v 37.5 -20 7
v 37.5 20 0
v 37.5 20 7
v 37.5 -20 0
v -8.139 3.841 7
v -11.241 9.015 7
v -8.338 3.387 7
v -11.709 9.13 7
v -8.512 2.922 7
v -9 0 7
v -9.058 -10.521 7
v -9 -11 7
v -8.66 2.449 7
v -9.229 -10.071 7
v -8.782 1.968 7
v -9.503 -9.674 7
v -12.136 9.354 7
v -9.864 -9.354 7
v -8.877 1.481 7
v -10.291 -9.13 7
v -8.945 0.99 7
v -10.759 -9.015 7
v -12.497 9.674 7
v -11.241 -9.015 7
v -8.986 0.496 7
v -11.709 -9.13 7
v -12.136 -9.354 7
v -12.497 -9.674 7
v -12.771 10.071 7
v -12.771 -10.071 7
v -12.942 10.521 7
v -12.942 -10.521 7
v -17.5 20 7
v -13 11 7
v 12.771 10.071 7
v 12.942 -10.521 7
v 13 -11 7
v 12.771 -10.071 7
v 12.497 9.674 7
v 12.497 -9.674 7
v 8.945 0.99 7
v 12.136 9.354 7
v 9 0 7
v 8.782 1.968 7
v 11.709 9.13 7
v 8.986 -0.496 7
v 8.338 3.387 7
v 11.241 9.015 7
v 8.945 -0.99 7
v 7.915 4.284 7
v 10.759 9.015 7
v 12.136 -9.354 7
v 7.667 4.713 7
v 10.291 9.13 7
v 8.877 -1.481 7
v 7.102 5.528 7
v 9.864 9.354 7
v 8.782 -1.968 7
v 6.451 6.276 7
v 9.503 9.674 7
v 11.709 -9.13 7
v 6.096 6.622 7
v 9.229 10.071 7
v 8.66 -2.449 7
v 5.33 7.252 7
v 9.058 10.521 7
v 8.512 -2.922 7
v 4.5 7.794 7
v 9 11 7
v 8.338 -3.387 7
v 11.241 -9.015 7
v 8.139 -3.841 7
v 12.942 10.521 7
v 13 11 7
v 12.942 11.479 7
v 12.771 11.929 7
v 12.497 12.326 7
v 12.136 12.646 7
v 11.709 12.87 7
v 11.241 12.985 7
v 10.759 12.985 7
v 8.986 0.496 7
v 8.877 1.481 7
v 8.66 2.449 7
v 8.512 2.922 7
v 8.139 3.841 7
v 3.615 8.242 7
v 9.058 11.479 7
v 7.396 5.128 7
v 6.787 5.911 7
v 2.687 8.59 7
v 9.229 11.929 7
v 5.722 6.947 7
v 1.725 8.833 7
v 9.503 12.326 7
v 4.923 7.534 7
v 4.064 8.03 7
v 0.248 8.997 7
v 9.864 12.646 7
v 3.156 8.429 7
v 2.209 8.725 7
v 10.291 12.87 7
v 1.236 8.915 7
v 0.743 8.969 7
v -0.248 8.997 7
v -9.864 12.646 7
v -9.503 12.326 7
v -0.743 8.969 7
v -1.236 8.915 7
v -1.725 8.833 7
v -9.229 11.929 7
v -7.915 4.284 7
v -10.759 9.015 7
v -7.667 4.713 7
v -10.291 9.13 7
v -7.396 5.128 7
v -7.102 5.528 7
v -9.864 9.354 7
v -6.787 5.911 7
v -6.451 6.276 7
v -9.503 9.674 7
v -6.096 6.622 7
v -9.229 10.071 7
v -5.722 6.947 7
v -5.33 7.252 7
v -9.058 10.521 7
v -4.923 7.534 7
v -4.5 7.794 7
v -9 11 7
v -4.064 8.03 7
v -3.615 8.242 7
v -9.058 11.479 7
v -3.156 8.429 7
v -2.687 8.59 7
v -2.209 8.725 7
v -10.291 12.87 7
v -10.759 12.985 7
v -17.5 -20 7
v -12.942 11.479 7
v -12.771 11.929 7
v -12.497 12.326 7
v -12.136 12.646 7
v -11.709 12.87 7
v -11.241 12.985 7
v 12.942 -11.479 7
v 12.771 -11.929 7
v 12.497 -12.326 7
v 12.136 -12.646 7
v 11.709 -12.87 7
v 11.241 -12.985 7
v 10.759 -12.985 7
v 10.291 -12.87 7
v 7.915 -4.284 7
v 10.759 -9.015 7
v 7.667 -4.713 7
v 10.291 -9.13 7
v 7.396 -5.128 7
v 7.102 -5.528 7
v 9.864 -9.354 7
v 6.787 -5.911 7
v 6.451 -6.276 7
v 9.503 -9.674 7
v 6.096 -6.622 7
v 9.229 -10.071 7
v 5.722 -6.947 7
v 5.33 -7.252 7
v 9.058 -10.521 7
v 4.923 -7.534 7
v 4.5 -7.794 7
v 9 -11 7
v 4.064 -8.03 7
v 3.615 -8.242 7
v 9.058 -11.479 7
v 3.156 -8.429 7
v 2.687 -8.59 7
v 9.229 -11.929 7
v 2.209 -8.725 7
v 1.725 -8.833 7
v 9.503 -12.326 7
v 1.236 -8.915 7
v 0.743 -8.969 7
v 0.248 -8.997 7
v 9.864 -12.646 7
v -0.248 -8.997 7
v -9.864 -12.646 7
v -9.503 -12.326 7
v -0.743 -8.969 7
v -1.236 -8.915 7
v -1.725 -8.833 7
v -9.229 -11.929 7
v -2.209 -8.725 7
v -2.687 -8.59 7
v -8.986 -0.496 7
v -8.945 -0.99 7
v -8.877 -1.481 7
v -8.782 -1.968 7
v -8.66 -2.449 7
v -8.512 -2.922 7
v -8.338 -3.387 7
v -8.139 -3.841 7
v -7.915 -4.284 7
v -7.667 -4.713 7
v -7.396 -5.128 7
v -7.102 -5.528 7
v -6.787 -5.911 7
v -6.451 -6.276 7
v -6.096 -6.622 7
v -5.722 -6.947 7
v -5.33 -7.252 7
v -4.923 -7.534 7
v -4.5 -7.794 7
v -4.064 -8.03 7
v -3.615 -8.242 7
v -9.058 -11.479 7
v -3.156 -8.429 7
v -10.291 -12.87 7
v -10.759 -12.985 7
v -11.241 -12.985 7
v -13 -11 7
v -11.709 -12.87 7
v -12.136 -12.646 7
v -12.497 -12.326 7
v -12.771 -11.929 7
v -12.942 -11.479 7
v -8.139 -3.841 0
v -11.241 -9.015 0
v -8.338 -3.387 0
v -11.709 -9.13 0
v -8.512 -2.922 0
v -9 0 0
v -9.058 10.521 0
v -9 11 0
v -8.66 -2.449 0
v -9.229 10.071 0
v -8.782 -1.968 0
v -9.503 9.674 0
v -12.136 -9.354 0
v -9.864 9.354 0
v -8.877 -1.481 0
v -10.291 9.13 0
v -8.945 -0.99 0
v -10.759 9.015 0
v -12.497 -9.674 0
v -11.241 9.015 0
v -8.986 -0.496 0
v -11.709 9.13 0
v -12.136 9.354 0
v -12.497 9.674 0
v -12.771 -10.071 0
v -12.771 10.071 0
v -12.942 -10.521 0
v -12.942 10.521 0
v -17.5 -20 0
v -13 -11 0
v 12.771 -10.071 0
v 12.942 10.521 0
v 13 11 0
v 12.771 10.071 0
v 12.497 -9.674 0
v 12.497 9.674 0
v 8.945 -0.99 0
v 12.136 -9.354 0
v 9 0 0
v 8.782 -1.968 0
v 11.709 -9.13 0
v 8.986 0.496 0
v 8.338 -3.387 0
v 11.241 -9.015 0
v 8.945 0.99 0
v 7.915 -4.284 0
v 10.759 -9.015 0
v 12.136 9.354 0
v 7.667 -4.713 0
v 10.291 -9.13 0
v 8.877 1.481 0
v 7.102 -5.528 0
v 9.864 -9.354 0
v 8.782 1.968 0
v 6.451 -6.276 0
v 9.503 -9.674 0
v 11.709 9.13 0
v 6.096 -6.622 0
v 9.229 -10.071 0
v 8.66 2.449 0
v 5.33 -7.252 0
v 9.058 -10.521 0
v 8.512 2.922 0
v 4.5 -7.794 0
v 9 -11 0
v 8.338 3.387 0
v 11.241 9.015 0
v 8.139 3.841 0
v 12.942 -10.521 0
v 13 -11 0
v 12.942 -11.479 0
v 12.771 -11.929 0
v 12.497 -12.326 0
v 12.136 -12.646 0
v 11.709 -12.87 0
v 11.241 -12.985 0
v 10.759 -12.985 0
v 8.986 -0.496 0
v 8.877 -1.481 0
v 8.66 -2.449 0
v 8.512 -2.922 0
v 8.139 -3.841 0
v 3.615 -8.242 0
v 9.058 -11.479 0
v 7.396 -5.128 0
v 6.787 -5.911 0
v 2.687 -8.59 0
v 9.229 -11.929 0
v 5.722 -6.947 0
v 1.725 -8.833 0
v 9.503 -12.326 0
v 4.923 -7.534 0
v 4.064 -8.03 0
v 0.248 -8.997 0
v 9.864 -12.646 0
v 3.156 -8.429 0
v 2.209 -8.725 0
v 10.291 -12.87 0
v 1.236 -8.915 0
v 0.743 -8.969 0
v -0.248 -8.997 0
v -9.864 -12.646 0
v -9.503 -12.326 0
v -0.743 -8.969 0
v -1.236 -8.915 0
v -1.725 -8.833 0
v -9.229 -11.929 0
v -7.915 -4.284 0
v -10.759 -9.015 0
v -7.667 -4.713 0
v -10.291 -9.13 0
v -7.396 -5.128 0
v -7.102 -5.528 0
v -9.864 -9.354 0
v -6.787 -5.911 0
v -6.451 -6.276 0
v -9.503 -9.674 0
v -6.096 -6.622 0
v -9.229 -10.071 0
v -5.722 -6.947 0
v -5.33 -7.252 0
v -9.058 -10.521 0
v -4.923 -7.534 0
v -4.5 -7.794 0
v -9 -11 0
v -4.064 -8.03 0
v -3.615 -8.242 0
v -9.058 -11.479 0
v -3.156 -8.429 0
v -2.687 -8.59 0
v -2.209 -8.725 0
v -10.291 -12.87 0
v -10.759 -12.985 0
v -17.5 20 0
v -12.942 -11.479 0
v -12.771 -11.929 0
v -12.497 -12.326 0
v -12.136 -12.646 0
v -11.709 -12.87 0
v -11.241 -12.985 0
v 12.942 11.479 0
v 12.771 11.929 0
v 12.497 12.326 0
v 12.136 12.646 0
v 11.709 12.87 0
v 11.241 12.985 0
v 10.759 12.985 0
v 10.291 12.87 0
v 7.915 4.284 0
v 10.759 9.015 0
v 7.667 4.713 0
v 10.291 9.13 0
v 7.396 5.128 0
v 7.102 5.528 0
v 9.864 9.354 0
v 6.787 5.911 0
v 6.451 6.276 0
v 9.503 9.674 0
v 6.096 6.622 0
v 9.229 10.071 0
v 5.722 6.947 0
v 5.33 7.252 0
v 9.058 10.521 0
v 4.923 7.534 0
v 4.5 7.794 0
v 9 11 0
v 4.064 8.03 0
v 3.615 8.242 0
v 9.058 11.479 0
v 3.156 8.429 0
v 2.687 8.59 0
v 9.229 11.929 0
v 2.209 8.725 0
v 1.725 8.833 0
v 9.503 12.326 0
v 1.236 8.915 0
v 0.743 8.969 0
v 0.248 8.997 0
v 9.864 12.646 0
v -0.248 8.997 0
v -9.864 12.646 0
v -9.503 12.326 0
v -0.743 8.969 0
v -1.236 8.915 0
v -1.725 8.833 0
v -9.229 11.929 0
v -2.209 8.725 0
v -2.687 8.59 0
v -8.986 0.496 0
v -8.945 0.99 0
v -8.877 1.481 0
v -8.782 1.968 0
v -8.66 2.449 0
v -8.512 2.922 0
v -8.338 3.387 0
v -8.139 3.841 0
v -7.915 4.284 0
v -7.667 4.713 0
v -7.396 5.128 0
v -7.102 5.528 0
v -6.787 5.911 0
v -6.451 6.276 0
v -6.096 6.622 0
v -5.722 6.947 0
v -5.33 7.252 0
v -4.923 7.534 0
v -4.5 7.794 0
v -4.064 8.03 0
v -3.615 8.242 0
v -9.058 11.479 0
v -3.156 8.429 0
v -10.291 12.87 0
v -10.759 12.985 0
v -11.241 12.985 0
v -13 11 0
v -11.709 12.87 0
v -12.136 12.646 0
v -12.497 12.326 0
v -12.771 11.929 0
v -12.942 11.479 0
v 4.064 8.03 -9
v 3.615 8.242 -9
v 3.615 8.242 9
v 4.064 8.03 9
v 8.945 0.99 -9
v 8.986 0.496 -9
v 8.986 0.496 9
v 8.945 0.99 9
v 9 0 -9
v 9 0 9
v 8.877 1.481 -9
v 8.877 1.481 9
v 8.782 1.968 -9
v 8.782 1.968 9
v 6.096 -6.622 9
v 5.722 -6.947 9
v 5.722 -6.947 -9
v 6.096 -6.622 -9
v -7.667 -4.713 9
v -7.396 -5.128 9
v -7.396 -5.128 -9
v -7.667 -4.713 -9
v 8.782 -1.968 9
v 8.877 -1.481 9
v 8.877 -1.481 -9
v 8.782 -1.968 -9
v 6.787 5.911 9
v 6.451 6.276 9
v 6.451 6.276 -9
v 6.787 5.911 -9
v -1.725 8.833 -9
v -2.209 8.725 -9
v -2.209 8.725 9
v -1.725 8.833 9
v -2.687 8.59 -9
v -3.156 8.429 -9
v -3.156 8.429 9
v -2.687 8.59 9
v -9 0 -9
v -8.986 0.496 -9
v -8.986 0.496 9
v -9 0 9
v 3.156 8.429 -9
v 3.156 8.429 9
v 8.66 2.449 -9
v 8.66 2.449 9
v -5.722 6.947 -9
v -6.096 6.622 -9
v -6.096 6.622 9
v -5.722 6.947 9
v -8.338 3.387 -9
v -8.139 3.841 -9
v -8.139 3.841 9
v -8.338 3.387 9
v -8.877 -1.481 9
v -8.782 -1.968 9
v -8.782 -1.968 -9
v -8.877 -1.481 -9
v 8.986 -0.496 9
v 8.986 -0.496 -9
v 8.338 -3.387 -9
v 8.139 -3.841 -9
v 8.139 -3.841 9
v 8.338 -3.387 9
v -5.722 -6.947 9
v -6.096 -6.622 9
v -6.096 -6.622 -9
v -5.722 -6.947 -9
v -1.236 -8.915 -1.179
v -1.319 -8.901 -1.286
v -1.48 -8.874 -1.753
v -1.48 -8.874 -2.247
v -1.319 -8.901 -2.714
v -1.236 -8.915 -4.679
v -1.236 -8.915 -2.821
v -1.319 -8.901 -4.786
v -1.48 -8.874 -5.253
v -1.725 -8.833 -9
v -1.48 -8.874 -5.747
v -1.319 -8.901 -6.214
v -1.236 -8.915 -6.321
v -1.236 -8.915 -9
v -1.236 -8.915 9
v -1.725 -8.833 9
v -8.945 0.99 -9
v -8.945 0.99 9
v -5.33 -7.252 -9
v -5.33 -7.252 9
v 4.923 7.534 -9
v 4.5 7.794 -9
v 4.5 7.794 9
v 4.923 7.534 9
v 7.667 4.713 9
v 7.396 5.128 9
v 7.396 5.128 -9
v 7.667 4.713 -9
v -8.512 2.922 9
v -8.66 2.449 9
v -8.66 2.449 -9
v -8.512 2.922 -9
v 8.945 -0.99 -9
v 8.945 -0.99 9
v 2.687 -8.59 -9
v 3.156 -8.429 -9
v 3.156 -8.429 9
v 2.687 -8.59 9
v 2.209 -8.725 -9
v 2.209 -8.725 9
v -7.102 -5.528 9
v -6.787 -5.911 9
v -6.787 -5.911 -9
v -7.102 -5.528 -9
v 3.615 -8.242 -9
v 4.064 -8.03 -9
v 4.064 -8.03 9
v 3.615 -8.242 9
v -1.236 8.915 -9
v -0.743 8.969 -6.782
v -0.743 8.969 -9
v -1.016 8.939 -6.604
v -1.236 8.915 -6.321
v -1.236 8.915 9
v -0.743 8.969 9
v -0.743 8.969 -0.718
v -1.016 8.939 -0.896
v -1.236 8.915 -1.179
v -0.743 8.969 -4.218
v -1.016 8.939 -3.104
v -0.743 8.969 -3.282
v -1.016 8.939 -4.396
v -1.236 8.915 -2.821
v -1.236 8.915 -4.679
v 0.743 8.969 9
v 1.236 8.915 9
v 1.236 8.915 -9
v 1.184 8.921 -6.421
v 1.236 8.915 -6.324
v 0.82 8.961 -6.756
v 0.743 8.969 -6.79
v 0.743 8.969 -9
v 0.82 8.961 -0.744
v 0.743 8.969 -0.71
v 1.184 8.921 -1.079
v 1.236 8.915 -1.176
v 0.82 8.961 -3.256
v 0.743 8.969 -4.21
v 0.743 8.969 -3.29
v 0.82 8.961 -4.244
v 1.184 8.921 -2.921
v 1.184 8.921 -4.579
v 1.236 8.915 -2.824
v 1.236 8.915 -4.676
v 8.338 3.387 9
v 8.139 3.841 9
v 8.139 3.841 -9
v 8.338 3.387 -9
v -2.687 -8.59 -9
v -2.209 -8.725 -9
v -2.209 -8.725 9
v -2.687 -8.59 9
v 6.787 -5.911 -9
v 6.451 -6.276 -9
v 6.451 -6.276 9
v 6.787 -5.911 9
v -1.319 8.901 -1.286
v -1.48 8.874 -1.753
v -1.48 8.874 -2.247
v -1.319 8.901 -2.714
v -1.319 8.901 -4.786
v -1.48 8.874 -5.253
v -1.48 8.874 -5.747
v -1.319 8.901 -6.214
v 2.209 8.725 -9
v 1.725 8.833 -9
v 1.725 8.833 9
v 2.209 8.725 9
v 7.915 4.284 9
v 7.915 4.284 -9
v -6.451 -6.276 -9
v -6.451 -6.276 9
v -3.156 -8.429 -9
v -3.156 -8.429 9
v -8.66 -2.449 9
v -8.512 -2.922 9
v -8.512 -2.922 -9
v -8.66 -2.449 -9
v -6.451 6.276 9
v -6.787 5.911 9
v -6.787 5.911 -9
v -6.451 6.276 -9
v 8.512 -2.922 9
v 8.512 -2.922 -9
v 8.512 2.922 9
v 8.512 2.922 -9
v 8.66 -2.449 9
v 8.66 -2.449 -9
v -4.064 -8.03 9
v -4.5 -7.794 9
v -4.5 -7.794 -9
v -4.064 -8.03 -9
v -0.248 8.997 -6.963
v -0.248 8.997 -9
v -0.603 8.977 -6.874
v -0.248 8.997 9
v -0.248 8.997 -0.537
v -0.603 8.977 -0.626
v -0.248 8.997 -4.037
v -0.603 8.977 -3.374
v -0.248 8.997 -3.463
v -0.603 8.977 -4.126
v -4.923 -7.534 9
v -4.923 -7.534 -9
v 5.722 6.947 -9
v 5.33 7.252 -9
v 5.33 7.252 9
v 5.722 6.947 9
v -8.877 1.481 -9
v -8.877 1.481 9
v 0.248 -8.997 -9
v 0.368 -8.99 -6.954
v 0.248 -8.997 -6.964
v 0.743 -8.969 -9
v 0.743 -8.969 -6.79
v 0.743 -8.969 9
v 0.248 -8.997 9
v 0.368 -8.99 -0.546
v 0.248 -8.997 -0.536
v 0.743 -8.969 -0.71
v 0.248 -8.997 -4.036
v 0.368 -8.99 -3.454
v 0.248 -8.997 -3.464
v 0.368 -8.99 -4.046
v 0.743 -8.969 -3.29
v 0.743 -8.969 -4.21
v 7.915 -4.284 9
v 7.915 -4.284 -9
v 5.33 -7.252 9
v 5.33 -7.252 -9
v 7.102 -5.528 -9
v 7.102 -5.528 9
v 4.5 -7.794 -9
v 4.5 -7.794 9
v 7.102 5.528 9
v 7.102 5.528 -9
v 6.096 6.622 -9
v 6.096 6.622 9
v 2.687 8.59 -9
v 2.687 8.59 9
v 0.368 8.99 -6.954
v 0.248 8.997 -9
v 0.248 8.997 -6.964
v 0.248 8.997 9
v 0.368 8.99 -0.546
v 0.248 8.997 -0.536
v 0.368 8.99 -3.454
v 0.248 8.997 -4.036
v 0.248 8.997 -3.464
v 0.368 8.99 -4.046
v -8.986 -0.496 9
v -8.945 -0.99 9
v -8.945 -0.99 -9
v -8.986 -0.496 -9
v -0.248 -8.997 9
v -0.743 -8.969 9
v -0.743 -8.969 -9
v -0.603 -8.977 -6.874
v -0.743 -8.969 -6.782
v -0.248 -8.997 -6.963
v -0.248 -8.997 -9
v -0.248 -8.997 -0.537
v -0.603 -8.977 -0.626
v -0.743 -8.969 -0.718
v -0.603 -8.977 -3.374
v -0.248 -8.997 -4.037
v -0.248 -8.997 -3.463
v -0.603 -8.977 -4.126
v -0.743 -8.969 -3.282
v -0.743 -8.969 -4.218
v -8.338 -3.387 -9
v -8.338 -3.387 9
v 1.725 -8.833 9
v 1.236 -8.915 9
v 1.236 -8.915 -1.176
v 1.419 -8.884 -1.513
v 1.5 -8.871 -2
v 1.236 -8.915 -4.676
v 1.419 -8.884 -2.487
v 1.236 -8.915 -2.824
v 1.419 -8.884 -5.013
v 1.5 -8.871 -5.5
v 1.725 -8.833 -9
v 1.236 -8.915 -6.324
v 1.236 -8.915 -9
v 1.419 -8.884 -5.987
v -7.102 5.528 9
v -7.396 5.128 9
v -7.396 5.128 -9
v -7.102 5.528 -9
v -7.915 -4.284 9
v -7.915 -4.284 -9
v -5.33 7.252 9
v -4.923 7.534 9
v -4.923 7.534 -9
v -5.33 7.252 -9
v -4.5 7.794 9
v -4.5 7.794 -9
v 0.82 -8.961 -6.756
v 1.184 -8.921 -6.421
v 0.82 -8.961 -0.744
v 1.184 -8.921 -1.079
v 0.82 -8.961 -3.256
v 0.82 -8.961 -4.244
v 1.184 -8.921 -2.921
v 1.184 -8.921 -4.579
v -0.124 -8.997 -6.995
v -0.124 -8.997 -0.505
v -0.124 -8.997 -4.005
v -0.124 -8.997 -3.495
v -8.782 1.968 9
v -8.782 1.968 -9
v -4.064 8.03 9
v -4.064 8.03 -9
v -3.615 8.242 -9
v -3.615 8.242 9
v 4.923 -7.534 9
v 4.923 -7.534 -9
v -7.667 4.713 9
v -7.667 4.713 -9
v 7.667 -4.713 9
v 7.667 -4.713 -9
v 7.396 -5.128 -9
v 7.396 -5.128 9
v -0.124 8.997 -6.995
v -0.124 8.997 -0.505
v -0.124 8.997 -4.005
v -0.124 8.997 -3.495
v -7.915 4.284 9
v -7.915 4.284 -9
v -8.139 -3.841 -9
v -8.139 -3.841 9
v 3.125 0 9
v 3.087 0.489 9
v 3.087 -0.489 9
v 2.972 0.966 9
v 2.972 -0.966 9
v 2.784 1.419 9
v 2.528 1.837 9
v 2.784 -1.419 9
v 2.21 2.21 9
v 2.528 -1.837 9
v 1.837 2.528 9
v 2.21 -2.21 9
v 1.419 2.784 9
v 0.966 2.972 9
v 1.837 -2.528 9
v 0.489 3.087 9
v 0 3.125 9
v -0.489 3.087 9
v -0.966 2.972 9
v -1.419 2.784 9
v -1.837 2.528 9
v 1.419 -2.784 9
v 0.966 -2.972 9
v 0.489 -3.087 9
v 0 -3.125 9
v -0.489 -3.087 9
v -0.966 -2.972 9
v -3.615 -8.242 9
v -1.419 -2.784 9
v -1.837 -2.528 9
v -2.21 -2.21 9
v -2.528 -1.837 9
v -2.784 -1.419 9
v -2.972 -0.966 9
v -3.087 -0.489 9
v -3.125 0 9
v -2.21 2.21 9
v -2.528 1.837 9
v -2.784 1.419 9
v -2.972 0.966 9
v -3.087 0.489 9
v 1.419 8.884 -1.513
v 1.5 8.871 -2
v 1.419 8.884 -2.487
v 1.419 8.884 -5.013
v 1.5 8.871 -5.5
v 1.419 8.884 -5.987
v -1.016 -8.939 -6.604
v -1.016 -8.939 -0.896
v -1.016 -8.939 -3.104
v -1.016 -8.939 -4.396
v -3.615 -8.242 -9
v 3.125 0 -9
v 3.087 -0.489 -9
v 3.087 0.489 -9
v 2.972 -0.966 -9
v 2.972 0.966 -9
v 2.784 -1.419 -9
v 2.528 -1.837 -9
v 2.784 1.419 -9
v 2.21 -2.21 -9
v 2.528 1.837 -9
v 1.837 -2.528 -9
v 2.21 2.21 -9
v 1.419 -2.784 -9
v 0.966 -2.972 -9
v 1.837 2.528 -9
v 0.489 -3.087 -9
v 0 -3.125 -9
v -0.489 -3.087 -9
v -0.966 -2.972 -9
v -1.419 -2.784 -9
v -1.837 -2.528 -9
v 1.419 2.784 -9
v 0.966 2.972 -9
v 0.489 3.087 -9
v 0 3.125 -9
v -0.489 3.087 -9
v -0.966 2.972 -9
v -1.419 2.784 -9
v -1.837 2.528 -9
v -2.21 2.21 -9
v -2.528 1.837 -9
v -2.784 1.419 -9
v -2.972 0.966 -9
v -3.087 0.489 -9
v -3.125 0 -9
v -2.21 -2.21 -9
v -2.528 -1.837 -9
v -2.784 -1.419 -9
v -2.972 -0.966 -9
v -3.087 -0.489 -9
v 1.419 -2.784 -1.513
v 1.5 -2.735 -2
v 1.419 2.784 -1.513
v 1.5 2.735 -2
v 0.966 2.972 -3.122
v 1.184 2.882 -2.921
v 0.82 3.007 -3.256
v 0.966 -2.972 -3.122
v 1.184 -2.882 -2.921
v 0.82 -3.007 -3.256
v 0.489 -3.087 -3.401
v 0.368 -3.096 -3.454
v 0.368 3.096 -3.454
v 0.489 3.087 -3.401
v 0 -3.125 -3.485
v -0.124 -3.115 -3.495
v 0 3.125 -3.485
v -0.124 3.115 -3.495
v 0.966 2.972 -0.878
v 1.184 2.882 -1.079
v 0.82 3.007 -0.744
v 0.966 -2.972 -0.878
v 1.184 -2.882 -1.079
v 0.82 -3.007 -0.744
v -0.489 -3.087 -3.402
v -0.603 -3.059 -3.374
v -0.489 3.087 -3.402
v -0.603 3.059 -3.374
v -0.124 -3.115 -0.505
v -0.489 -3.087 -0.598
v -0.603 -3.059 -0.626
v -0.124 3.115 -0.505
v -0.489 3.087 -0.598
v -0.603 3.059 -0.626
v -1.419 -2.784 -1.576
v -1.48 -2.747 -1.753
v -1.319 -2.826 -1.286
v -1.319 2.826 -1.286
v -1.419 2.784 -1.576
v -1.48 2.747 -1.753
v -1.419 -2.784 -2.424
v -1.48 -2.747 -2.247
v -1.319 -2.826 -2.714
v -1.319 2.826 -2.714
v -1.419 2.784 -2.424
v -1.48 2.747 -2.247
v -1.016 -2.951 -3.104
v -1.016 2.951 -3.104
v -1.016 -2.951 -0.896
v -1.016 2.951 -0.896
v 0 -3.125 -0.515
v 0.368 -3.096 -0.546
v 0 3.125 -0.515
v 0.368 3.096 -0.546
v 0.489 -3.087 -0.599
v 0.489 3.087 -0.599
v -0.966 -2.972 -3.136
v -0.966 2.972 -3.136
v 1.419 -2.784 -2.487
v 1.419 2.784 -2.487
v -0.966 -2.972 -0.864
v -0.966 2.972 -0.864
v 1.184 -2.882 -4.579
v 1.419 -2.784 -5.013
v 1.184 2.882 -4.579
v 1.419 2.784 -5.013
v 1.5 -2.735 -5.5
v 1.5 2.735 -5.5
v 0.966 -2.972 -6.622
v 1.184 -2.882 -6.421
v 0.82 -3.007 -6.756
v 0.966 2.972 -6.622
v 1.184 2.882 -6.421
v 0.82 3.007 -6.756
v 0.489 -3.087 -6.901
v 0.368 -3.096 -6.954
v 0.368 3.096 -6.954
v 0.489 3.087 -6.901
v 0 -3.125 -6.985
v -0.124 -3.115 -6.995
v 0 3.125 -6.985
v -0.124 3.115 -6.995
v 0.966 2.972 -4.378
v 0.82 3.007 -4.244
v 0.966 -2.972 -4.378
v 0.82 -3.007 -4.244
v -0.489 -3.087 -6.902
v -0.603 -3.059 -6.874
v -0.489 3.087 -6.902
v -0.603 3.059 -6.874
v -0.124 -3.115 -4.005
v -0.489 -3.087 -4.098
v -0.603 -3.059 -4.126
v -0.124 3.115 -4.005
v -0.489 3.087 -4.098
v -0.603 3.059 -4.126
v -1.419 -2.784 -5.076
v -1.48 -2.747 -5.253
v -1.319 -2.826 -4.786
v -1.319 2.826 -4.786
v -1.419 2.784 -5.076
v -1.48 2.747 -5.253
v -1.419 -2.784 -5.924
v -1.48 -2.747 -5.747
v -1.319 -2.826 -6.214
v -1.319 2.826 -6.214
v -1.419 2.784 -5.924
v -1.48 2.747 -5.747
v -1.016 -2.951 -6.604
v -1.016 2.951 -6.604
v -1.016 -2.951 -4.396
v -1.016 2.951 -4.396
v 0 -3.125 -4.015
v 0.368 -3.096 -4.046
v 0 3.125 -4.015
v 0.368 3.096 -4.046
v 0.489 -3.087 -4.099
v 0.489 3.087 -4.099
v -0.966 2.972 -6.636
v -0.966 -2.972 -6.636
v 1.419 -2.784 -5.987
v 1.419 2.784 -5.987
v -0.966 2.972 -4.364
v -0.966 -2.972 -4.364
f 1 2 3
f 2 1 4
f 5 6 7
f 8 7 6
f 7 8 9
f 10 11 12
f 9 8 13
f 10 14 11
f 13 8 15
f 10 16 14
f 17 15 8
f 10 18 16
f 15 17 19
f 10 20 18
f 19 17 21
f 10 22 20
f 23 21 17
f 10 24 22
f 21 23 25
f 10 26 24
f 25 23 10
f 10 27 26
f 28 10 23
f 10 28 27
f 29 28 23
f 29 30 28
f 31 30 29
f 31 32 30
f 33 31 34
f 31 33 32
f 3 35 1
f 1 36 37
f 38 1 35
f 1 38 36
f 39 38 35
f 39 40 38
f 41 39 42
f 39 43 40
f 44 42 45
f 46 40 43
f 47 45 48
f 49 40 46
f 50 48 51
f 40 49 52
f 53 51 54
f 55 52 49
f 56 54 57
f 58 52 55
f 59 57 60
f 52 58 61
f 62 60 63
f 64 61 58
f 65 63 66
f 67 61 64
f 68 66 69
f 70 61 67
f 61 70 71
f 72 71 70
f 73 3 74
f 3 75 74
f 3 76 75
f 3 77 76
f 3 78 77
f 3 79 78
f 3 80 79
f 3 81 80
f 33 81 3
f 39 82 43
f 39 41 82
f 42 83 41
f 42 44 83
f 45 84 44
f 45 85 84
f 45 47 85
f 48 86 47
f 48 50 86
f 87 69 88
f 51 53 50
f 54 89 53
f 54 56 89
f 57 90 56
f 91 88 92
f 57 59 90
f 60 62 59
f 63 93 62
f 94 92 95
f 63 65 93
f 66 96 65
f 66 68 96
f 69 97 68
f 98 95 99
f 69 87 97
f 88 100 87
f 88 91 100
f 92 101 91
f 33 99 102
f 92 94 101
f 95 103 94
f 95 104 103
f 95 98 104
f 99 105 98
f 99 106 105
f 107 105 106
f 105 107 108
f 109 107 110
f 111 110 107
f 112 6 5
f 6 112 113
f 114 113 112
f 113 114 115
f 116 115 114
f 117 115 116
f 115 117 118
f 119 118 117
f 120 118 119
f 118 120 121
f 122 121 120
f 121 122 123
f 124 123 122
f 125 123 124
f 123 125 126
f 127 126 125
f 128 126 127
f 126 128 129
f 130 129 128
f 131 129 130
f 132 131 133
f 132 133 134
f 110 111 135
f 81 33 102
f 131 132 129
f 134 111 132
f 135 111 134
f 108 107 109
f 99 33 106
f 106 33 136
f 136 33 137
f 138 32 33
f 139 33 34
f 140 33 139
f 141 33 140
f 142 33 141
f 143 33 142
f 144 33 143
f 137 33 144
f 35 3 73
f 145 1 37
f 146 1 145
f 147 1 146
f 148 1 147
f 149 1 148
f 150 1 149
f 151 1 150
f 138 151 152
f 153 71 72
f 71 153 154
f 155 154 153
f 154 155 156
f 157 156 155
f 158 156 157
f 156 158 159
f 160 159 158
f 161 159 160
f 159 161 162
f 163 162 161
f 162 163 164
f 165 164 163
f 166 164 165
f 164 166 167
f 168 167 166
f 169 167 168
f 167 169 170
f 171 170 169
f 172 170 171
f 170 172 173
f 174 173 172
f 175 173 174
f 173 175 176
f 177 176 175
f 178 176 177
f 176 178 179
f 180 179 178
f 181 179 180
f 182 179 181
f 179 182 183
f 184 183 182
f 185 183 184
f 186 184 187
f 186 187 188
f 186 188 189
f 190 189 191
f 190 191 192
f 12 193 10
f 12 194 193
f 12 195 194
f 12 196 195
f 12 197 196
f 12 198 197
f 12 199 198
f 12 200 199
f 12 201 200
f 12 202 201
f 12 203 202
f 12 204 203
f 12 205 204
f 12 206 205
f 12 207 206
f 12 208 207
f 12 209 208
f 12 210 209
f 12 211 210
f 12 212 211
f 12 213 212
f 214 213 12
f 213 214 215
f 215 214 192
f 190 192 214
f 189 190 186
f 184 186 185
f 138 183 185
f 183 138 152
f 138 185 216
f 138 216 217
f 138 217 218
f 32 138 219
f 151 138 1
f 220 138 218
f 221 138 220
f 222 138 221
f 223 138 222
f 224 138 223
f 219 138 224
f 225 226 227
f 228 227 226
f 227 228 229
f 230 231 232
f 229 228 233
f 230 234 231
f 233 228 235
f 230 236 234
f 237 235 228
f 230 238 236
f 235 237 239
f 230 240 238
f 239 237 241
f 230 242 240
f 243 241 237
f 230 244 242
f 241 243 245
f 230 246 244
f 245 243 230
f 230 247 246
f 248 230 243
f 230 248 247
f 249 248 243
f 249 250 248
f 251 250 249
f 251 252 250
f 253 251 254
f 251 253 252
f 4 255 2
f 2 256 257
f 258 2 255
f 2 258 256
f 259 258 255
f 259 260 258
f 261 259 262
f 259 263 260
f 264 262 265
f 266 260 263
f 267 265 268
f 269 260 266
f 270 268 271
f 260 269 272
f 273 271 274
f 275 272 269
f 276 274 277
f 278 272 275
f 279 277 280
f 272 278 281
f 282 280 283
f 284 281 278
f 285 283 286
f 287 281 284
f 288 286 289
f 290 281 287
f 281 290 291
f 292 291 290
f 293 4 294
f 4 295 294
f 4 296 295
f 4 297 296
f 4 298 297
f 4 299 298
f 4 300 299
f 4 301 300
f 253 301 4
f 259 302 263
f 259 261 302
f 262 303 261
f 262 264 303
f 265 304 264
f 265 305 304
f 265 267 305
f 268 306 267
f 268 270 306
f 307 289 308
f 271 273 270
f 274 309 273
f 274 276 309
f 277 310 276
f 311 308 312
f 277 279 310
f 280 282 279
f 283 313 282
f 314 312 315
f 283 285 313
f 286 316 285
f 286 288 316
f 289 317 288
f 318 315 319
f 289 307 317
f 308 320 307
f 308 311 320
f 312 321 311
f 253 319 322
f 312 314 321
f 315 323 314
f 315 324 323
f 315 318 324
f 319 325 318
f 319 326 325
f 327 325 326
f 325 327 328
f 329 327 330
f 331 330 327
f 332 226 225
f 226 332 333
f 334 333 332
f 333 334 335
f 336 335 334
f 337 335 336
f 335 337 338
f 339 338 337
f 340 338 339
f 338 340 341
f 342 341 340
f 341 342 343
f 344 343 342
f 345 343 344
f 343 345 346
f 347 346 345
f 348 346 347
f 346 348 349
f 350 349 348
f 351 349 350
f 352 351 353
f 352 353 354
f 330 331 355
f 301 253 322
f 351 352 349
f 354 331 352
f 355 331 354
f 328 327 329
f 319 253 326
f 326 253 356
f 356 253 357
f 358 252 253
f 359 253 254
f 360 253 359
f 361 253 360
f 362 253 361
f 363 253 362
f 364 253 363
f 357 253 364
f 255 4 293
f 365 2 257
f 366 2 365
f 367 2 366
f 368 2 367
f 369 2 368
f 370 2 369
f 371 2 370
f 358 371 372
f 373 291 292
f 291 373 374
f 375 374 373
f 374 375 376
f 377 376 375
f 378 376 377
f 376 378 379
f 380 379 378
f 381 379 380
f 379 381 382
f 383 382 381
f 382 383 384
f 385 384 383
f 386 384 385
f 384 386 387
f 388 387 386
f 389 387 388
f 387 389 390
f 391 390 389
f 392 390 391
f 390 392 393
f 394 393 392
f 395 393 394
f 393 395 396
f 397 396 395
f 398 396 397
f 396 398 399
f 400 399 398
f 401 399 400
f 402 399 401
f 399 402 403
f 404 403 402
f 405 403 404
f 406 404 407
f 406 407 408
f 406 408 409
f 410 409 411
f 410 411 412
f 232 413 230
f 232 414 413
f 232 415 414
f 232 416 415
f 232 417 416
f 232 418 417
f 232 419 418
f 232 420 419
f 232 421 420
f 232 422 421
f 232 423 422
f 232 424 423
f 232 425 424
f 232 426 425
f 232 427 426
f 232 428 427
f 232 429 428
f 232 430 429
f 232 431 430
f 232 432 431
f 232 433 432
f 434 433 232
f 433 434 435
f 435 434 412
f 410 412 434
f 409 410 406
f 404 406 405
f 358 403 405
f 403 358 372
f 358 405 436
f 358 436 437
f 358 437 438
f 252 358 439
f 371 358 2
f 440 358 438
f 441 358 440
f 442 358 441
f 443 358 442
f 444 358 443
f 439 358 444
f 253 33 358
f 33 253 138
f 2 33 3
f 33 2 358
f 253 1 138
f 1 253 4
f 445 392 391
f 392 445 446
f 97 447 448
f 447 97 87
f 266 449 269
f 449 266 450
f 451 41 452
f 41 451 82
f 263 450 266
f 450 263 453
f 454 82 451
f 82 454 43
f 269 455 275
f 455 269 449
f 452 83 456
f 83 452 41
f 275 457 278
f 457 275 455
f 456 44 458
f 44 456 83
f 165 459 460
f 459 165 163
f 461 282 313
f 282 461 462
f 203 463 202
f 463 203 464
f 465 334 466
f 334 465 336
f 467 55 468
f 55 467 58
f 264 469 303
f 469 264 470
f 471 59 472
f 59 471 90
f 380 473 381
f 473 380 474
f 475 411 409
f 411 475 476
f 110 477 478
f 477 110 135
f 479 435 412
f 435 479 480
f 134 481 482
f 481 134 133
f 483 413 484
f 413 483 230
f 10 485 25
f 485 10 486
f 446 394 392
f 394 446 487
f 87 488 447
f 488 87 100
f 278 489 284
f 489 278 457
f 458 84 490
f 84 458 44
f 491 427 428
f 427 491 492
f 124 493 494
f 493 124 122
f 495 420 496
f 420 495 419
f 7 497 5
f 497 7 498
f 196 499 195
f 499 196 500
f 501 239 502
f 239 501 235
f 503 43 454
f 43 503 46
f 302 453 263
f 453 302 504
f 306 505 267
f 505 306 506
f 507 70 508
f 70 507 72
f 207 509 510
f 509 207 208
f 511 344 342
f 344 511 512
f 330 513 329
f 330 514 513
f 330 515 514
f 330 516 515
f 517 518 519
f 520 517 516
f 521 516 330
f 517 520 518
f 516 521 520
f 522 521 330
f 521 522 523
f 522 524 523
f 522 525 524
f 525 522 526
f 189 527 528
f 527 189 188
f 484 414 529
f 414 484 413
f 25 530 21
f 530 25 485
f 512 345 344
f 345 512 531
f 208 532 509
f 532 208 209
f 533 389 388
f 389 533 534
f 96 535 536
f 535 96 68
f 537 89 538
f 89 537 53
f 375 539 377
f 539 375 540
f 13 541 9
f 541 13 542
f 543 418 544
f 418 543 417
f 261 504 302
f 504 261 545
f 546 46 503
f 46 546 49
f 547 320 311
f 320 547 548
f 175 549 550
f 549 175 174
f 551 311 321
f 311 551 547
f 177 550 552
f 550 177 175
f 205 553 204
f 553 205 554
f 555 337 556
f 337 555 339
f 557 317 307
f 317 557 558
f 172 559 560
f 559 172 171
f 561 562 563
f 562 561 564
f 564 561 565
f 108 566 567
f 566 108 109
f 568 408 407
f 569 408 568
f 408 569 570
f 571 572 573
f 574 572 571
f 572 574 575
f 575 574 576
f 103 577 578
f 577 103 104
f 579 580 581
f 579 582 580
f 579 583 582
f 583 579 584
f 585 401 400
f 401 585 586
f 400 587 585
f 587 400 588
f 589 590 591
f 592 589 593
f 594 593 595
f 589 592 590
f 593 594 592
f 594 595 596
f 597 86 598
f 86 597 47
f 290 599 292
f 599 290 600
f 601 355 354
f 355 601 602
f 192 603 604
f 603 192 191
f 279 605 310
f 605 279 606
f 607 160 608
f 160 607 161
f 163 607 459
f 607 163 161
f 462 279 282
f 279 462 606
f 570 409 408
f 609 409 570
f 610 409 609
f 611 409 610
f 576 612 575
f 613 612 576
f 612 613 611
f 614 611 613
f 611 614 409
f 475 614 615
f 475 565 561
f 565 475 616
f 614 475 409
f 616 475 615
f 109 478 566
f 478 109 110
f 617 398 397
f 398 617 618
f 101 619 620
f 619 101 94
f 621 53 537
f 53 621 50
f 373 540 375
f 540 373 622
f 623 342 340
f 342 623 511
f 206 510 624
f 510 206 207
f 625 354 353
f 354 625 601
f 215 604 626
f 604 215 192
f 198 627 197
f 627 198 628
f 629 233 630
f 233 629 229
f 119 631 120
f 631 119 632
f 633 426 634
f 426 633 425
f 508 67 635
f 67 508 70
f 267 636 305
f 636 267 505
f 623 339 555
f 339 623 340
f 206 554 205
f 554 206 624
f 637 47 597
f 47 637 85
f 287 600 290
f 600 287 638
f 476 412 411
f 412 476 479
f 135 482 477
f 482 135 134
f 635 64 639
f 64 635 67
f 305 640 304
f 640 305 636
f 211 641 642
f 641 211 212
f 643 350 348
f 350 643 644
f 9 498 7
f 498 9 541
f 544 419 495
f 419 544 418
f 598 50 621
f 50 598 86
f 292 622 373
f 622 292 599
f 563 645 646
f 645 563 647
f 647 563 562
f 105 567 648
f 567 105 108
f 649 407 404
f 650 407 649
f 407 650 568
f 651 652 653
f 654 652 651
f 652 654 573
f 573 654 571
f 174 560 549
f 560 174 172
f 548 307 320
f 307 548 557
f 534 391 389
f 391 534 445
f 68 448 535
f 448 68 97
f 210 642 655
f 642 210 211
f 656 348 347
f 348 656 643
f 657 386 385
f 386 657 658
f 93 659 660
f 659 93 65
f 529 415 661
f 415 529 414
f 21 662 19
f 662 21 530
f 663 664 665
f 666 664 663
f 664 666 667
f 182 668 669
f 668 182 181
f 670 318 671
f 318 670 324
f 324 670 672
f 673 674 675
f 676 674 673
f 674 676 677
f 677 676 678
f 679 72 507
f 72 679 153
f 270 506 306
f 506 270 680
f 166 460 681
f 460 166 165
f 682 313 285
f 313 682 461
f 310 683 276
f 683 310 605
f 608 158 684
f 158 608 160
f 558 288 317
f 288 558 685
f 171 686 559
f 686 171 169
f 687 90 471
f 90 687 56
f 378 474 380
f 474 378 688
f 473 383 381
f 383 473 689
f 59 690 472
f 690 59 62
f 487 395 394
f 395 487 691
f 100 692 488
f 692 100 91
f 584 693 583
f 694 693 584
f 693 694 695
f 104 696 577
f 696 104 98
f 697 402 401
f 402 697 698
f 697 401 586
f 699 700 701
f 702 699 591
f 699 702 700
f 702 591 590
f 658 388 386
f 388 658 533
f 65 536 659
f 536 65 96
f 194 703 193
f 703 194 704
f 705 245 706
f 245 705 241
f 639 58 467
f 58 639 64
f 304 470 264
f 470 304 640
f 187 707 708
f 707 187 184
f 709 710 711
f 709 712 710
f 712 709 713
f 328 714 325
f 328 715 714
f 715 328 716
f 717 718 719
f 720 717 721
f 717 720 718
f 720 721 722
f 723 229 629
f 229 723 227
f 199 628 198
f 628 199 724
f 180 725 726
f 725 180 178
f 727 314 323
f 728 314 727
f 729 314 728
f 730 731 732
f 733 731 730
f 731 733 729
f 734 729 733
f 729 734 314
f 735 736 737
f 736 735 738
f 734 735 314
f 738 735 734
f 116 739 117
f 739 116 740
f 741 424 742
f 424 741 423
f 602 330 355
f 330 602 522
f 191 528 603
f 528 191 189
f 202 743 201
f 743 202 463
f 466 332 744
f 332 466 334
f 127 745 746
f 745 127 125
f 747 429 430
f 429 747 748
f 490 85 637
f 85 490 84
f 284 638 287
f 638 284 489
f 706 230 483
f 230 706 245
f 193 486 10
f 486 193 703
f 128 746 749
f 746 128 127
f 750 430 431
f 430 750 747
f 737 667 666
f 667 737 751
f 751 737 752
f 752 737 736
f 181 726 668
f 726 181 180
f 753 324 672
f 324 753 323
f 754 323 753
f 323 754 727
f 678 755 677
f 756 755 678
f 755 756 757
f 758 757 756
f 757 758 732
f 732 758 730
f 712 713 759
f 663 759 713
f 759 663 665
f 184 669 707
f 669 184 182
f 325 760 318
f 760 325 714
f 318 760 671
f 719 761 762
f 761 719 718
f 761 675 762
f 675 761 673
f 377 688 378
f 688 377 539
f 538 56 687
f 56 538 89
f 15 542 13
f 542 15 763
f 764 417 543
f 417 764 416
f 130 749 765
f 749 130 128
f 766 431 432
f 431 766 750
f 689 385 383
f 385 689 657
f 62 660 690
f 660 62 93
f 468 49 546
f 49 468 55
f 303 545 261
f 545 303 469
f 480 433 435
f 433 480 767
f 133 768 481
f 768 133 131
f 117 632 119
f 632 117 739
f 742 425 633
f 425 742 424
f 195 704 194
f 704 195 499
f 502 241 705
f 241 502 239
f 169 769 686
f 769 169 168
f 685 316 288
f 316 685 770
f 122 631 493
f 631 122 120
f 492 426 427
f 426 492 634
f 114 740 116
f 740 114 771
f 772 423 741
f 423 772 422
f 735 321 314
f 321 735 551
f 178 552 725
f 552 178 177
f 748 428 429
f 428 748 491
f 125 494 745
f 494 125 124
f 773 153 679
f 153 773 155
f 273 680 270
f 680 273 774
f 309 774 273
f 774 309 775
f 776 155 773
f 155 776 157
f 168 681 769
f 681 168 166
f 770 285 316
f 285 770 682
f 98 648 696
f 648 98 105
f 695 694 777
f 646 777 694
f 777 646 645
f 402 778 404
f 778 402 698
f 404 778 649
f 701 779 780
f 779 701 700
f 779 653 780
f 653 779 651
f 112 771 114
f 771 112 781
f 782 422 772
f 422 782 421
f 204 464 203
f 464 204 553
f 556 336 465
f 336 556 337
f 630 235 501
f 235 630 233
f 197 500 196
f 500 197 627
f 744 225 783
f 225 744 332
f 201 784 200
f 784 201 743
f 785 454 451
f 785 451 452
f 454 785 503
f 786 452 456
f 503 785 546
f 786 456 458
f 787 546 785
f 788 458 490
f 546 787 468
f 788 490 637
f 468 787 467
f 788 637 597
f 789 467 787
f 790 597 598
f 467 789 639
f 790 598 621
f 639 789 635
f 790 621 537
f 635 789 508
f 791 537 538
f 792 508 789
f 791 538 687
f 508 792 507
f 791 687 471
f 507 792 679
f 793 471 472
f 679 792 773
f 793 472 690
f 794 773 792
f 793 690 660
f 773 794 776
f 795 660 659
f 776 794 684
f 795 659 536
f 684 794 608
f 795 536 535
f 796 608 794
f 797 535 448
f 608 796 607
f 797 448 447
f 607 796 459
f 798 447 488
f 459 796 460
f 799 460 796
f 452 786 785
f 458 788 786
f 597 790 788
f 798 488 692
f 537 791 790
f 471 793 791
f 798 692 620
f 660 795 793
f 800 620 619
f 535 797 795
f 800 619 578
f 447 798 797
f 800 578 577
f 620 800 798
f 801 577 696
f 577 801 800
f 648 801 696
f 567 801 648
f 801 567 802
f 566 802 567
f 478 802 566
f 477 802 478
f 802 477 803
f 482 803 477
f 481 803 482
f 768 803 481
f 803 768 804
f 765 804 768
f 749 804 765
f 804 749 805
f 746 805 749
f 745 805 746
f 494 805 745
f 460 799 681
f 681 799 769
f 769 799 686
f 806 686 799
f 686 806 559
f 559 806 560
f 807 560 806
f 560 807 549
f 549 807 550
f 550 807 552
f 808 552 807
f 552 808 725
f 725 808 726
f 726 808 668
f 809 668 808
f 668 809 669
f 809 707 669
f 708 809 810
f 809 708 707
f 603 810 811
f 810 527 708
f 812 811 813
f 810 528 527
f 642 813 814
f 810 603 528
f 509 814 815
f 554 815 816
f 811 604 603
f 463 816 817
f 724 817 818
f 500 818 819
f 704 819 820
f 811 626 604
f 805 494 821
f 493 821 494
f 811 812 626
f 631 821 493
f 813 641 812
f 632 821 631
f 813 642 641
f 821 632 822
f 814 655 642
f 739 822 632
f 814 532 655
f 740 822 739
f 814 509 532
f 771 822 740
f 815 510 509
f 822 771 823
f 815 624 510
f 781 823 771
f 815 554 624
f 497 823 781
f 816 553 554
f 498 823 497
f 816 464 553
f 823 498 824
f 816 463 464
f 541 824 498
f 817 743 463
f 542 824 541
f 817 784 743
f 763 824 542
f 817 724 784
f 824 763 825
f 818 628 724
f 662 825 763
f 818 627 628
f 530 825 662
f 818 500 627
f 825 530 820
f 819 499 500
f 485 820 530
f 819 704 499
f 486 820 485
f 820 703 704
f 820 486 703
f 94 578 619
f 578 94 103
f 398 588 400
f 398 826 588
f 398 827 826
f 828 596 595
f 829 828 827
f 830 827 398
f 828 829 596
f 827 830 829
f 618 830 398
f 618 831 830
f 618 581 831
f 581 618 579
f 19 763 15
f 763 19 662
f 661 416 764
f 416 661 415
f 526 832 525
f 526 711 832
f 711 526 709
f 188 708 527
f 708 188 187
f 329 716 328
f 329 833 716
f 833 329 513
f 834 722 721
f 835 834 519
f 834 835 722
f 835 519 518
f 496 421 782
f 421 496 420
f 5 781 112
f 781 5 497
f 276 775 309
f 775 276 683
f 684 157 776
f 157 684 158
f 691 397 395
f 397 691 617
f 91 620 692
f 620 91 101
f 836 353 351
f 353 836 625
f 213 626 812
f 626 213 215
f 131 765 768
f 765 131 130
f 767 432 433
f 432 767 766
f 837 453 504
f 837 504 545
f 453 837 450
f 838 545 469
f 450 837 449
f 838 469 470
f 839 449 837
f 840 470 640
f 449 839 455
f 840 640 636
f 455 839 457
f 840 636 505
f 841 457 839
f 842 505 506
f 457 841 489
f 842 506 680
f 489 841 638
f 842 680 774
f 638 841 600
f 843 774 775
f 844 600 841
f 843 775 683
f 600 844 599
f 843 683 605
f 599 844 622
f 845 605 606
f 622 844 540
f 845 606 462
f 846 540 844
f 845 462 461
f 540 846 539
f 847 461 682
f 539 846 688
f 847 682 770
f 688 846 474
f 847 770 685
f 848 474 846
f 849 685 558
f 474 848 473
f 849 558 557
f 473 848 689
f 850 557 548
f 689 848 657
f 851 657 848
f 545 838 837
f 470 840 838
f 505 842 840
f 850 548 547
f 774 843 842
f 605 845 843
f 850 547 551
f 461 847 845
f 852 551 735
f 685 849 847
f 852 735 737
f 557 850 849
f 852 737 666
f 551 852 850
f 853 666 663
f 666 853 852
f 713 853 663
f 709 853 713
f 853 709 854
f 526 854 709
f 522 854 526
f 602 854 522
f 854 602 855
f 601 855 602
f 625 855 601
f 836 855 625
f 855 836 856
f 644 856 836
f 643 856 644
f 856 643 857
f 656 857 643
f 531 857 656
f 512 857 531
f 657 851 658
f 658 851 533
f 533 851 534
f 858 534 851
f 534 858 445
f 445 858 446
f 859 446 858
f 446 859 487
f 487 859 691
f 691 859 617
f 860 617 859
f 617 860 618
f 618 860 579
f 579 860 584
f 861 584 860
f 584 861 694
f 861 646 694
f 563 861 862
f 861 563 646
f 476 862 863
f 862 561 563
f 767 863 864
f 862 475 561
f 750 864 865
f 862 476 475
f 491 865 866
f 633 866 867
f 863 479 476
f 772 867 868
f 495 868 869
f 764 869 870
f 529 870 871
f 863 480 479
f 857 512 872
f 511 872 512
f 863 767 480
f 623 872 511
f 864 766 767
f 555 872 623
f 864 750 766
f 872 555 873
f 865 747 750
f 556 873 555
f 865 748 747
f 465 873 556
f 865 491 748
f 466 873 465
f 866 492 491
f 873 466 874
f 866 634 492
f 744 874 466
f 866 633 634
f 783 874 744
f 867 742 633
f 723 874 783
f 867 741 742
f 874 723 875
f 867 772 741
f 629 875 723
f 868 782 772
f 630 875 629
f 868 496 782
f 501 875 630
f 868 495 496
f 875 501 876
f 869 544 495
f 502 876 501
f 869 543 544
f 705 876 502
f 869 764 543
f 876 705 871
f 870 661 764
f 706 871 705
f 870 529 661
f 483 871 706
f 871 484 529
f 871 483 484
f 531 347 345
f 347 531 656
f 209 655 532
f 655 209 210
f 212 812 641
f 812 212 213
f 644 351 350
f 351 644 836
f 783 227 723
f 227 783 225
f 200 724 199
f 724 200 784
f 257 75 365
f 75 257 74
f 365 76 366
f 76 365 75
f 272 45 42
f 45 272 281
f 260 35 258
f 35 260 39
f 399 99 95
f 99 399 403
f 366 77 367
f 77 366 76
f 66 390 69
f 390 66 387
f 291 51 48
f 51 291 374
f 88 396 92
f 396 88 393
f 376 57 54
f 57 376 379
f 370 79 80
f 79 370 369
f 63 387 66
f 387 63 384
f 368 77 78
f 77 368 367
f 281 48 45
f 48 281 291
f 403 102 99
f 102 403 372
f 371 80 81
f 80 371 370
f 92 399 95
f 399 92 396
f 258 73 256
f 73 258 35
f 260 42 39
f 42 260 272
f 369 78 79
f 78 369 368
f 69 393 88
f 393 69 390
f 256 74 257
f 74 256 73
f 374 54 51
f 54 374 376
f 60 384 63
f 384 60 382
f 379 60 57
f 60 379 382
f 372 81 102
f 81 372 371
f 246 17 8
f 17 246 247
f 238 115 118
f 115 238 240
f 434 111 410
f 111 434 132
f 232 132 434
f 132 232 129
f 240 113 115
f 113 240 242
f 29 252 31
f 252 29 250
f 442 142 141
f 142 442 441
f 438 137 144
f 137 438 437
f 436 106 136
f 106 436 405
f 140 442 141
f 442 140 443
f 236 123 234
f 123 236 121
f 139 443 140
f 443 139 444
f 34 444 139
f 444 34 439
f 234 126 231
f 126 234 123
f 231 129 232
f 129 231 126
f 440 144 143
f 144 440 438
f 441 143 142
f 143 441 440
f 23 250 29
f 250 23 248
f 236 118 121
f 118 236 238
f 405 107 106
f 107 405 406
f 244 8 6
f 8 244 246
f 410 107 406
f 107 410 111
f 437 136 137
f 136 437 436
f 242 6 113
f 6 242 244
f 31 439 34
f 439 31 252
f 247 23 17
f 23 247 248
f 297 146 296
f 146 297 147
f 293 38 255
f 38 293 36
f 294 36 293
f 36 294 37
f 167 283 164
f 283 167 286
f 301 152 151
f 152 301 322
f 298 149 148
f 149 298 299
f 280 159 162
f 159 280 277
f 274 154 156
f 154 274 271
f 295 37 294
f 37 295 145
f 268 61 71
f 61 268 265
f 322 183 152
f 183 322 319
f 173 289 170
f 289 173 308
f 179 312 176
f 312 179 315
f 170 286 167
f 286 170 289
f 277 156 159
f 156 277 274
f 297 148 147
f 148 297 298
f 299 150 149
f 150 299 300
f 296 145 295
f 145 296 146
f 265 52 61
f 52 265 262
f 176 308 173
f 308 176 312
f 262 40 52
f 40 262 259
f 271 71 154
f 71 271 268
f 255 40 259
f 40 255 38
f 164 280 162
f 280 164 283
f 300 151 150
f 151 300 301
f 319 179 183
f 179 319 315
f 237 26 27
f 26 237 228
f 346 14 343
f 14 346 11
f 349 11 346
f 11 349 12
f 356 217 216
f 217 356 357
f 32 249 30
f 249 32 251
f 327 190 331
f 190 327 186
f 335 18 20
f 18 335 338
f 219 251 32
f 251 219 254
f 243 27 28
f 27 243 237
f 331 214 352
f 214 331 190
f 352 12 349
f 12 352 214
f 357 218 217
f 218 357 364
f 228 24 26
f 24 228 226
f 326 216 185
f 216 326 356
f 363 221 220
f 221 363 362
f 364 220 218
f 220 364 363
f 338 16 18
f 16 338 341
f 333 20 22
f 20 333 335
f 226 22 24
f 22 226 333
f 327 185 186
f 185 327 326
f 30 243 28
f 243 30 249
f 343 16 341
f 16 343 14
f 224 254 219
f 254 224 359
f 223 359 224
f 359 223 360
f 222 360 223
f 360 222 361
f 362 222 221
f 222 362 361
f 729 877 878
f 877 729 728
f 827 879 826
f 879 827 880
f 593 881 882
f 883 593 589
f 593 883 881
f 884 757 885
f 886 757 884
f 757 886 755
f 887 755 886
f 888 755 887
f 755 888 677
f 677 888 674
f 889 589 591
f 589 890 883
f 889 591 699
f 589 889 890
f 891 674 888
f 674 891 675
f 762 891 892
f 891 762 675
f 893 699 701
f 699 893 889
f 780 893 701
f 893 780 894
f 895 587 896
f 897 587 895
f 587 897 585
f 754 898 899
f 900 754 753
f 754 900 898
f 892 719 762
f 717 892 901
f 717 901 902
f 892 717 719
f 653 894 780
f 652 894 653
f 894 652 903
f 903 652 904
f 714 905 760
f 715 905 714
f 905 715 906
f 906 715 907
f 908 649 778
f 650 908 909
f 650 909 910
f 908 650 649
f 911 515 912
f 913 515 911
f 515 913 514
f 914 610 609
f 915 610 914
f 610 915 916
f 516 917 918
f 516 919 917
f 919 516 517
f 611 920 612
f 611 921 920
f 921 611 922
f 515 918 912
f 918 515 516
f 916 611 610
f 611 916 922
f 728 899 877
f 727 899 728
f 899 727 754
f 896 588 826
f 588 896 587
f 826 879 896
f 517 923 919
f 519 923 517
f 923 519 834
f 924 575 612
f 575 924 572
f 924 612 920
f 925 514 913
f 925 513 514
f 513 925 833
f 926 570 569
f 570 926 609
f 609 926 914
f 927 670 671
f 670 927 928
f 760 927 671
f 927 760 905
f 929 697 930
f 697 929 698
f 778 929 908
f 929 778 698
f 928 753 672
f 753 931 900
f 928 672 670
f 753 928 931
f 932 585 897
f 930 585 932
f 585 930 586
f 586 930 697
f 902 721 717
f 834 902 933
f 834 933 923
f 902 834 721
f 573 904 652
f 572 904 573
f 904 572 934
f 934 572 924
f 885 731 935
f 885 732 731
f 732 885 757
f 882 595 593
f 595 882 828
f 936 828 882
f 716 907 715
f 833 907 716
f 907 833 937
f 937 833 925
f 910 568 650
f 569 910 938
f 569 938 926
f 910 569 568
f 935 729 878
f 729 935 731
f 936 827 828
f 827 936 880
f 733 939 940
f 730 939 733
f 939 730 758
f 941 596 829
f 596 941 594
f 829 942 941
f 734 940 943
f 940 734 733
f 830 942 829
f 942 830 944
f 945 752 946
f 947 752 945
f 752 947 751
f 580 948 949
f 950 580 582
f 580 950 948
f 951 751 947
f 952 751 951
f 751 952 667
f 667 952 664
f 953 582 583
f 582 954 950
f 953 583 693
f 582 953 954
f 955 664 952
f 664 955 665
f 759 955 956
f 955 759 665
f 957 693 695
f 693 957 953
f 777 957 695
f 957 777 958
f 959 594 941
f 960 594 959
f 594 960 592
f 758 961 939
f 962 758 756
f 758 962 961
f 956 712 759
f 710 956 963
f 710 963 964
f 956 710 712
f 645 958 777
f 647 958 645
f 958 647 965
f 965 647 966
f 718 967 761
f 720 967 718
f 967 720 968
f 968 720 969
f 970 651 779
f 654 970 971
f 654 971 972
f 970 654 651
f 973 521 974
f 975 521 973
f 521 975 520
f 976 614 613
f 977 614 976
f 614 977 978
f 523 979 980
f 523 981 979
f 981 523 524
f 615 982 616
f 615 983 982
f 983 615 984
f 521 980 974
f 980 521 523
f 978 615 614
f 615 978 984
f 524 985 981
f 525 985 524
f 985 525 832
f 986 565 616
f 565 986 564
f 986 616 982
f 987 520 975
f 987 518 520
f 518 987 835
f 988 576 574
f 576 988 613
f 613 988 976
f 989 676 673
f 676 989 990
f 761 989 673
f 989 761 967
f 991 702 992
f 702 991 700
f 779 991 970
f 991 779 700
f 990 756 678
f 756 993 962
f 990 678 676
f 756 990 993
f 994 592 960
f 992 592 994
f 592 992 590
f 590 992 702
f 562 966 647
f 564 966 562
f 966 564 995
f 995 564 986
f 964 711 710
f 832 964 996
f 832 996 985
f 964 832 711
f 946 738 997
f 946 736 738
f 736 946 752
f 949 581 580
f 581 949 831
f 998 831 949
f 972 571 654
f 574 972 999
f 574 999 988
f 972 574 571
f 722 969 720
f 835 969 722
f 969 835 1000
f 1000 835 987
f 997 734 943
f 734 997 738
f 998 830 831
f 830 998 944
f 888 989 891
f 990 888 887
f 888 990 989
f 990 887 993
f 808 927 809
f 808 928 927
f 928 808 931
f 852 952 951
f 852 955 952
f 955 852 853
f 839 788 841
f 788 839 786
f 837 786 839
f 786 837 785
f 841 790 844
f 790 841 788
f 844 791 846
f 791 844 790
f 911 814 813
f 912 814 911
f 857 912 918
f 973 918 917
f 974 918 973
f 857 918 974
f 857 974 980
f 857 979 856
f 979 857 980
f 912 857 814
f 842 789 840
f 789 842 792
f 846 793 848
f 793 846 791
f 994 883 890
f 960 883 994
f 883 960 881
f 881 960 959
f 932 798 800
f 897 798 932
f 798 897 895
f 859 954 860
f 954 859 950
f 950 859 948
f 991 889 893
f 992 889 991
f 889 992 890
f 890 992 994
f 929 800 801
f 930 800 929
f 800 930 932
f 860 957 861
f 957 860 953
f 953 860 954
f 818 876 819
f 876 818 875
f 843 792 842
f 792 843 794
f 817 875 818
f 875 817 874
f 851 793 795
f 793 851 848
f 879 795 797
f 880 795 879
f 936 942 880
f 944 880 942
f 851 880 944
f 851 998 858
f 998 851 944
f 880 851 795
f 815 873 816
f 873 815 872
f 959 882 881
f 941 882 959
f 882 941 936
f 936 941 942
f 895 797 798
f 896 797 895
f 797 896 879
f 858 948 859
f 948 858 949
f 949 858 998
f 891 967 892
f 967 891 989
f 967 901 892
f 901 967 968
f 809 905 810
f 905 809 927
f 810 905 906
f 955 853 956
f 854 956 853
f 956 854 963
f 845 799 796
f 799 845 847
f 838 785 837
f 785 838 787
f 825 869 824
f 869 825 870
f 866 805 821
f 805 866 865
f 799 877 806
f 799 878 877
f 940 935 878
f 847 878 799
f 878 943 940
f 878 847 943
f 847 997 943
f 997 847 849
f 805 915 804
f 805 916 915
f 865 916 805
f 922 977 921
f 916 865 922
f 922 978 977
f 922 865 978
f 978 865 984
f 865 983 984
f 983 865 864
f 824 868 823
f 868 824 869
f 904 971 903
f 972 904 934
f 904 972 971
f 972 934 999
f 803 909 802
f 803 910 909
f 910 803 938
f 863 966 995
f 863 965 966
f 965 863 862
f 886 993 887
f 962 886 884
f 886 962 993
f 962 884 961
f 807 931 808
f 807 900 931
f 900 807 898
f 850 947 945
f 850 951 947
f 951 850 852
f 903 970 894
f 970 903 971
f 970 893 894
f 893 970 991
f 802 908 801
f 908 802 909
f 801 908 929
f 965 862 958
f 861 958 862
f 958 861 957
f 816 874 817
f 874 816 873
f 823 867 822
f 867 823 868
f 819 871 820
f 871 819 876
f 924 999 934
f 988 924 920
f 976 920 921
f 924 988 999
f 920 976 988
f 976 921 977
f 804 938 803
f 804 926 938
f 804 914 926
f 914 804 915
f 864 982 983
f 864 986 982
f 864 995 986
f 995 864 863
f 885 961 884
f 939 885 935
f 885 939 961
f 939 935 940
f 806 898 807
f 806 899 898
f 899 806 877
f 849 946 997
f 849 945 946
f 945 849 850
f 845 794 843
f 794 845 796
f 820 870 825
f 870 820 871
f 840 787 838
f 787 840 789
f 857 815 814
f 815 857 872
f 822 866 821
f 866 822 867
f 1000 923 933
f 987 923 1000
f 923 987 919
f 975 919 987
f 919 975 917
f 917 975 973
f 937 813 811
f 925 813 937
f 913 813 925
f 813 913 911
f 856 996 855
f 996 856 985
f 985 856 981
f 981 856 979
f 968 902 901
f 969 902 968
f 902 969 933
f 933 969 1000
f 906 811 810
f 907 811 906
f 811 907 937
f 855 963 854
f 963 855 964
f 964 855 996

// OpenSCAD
$fa=0.5; // default minimum facet angle is now 0.5
$fs=0.5; // default minimum facet size is now 0.5 mm

difference() {
    union() {
        //main body
        translate([10, 0, 7/2]) 
        cube([55, 40, 7], center = true);
      
        //cylinder
        translate([0, 0, 0])
        cylinder(r = 9, h= 18, center = true); 
    }
    
    //screw holes for main
    translate([11, 11, 8/2]) 
    cylinder(r = 2, h=8.1, center = true);
    
    translate([-11, 11, 8/2]) 
    cylinder(r = 2, h=8.1, center = true);
    
    translate([11, -11, 8/2]) 
    cylinder(r = 2, h=8.1, center = true);
    
    translate([-11, -11, 8/2]) 
    cylinder(r = 2, h=8.1, center = true);
    
    //screw holes for cylinder
    rotate([90, 0, 0])
    translate([0, -2, 0]) 
    cylinder(r = 1.5, h=19, center = true);
    
    rotate([90, 0, 0])
    translate([0, -5.5, 0]) 
    cylinder(r = 1.5, h=19, center = true);
    
    //cylindrical hole
    translate([0, 0, 0]) 
    cylinder(r = 6.25/2, h=18.1, center = true);
}
